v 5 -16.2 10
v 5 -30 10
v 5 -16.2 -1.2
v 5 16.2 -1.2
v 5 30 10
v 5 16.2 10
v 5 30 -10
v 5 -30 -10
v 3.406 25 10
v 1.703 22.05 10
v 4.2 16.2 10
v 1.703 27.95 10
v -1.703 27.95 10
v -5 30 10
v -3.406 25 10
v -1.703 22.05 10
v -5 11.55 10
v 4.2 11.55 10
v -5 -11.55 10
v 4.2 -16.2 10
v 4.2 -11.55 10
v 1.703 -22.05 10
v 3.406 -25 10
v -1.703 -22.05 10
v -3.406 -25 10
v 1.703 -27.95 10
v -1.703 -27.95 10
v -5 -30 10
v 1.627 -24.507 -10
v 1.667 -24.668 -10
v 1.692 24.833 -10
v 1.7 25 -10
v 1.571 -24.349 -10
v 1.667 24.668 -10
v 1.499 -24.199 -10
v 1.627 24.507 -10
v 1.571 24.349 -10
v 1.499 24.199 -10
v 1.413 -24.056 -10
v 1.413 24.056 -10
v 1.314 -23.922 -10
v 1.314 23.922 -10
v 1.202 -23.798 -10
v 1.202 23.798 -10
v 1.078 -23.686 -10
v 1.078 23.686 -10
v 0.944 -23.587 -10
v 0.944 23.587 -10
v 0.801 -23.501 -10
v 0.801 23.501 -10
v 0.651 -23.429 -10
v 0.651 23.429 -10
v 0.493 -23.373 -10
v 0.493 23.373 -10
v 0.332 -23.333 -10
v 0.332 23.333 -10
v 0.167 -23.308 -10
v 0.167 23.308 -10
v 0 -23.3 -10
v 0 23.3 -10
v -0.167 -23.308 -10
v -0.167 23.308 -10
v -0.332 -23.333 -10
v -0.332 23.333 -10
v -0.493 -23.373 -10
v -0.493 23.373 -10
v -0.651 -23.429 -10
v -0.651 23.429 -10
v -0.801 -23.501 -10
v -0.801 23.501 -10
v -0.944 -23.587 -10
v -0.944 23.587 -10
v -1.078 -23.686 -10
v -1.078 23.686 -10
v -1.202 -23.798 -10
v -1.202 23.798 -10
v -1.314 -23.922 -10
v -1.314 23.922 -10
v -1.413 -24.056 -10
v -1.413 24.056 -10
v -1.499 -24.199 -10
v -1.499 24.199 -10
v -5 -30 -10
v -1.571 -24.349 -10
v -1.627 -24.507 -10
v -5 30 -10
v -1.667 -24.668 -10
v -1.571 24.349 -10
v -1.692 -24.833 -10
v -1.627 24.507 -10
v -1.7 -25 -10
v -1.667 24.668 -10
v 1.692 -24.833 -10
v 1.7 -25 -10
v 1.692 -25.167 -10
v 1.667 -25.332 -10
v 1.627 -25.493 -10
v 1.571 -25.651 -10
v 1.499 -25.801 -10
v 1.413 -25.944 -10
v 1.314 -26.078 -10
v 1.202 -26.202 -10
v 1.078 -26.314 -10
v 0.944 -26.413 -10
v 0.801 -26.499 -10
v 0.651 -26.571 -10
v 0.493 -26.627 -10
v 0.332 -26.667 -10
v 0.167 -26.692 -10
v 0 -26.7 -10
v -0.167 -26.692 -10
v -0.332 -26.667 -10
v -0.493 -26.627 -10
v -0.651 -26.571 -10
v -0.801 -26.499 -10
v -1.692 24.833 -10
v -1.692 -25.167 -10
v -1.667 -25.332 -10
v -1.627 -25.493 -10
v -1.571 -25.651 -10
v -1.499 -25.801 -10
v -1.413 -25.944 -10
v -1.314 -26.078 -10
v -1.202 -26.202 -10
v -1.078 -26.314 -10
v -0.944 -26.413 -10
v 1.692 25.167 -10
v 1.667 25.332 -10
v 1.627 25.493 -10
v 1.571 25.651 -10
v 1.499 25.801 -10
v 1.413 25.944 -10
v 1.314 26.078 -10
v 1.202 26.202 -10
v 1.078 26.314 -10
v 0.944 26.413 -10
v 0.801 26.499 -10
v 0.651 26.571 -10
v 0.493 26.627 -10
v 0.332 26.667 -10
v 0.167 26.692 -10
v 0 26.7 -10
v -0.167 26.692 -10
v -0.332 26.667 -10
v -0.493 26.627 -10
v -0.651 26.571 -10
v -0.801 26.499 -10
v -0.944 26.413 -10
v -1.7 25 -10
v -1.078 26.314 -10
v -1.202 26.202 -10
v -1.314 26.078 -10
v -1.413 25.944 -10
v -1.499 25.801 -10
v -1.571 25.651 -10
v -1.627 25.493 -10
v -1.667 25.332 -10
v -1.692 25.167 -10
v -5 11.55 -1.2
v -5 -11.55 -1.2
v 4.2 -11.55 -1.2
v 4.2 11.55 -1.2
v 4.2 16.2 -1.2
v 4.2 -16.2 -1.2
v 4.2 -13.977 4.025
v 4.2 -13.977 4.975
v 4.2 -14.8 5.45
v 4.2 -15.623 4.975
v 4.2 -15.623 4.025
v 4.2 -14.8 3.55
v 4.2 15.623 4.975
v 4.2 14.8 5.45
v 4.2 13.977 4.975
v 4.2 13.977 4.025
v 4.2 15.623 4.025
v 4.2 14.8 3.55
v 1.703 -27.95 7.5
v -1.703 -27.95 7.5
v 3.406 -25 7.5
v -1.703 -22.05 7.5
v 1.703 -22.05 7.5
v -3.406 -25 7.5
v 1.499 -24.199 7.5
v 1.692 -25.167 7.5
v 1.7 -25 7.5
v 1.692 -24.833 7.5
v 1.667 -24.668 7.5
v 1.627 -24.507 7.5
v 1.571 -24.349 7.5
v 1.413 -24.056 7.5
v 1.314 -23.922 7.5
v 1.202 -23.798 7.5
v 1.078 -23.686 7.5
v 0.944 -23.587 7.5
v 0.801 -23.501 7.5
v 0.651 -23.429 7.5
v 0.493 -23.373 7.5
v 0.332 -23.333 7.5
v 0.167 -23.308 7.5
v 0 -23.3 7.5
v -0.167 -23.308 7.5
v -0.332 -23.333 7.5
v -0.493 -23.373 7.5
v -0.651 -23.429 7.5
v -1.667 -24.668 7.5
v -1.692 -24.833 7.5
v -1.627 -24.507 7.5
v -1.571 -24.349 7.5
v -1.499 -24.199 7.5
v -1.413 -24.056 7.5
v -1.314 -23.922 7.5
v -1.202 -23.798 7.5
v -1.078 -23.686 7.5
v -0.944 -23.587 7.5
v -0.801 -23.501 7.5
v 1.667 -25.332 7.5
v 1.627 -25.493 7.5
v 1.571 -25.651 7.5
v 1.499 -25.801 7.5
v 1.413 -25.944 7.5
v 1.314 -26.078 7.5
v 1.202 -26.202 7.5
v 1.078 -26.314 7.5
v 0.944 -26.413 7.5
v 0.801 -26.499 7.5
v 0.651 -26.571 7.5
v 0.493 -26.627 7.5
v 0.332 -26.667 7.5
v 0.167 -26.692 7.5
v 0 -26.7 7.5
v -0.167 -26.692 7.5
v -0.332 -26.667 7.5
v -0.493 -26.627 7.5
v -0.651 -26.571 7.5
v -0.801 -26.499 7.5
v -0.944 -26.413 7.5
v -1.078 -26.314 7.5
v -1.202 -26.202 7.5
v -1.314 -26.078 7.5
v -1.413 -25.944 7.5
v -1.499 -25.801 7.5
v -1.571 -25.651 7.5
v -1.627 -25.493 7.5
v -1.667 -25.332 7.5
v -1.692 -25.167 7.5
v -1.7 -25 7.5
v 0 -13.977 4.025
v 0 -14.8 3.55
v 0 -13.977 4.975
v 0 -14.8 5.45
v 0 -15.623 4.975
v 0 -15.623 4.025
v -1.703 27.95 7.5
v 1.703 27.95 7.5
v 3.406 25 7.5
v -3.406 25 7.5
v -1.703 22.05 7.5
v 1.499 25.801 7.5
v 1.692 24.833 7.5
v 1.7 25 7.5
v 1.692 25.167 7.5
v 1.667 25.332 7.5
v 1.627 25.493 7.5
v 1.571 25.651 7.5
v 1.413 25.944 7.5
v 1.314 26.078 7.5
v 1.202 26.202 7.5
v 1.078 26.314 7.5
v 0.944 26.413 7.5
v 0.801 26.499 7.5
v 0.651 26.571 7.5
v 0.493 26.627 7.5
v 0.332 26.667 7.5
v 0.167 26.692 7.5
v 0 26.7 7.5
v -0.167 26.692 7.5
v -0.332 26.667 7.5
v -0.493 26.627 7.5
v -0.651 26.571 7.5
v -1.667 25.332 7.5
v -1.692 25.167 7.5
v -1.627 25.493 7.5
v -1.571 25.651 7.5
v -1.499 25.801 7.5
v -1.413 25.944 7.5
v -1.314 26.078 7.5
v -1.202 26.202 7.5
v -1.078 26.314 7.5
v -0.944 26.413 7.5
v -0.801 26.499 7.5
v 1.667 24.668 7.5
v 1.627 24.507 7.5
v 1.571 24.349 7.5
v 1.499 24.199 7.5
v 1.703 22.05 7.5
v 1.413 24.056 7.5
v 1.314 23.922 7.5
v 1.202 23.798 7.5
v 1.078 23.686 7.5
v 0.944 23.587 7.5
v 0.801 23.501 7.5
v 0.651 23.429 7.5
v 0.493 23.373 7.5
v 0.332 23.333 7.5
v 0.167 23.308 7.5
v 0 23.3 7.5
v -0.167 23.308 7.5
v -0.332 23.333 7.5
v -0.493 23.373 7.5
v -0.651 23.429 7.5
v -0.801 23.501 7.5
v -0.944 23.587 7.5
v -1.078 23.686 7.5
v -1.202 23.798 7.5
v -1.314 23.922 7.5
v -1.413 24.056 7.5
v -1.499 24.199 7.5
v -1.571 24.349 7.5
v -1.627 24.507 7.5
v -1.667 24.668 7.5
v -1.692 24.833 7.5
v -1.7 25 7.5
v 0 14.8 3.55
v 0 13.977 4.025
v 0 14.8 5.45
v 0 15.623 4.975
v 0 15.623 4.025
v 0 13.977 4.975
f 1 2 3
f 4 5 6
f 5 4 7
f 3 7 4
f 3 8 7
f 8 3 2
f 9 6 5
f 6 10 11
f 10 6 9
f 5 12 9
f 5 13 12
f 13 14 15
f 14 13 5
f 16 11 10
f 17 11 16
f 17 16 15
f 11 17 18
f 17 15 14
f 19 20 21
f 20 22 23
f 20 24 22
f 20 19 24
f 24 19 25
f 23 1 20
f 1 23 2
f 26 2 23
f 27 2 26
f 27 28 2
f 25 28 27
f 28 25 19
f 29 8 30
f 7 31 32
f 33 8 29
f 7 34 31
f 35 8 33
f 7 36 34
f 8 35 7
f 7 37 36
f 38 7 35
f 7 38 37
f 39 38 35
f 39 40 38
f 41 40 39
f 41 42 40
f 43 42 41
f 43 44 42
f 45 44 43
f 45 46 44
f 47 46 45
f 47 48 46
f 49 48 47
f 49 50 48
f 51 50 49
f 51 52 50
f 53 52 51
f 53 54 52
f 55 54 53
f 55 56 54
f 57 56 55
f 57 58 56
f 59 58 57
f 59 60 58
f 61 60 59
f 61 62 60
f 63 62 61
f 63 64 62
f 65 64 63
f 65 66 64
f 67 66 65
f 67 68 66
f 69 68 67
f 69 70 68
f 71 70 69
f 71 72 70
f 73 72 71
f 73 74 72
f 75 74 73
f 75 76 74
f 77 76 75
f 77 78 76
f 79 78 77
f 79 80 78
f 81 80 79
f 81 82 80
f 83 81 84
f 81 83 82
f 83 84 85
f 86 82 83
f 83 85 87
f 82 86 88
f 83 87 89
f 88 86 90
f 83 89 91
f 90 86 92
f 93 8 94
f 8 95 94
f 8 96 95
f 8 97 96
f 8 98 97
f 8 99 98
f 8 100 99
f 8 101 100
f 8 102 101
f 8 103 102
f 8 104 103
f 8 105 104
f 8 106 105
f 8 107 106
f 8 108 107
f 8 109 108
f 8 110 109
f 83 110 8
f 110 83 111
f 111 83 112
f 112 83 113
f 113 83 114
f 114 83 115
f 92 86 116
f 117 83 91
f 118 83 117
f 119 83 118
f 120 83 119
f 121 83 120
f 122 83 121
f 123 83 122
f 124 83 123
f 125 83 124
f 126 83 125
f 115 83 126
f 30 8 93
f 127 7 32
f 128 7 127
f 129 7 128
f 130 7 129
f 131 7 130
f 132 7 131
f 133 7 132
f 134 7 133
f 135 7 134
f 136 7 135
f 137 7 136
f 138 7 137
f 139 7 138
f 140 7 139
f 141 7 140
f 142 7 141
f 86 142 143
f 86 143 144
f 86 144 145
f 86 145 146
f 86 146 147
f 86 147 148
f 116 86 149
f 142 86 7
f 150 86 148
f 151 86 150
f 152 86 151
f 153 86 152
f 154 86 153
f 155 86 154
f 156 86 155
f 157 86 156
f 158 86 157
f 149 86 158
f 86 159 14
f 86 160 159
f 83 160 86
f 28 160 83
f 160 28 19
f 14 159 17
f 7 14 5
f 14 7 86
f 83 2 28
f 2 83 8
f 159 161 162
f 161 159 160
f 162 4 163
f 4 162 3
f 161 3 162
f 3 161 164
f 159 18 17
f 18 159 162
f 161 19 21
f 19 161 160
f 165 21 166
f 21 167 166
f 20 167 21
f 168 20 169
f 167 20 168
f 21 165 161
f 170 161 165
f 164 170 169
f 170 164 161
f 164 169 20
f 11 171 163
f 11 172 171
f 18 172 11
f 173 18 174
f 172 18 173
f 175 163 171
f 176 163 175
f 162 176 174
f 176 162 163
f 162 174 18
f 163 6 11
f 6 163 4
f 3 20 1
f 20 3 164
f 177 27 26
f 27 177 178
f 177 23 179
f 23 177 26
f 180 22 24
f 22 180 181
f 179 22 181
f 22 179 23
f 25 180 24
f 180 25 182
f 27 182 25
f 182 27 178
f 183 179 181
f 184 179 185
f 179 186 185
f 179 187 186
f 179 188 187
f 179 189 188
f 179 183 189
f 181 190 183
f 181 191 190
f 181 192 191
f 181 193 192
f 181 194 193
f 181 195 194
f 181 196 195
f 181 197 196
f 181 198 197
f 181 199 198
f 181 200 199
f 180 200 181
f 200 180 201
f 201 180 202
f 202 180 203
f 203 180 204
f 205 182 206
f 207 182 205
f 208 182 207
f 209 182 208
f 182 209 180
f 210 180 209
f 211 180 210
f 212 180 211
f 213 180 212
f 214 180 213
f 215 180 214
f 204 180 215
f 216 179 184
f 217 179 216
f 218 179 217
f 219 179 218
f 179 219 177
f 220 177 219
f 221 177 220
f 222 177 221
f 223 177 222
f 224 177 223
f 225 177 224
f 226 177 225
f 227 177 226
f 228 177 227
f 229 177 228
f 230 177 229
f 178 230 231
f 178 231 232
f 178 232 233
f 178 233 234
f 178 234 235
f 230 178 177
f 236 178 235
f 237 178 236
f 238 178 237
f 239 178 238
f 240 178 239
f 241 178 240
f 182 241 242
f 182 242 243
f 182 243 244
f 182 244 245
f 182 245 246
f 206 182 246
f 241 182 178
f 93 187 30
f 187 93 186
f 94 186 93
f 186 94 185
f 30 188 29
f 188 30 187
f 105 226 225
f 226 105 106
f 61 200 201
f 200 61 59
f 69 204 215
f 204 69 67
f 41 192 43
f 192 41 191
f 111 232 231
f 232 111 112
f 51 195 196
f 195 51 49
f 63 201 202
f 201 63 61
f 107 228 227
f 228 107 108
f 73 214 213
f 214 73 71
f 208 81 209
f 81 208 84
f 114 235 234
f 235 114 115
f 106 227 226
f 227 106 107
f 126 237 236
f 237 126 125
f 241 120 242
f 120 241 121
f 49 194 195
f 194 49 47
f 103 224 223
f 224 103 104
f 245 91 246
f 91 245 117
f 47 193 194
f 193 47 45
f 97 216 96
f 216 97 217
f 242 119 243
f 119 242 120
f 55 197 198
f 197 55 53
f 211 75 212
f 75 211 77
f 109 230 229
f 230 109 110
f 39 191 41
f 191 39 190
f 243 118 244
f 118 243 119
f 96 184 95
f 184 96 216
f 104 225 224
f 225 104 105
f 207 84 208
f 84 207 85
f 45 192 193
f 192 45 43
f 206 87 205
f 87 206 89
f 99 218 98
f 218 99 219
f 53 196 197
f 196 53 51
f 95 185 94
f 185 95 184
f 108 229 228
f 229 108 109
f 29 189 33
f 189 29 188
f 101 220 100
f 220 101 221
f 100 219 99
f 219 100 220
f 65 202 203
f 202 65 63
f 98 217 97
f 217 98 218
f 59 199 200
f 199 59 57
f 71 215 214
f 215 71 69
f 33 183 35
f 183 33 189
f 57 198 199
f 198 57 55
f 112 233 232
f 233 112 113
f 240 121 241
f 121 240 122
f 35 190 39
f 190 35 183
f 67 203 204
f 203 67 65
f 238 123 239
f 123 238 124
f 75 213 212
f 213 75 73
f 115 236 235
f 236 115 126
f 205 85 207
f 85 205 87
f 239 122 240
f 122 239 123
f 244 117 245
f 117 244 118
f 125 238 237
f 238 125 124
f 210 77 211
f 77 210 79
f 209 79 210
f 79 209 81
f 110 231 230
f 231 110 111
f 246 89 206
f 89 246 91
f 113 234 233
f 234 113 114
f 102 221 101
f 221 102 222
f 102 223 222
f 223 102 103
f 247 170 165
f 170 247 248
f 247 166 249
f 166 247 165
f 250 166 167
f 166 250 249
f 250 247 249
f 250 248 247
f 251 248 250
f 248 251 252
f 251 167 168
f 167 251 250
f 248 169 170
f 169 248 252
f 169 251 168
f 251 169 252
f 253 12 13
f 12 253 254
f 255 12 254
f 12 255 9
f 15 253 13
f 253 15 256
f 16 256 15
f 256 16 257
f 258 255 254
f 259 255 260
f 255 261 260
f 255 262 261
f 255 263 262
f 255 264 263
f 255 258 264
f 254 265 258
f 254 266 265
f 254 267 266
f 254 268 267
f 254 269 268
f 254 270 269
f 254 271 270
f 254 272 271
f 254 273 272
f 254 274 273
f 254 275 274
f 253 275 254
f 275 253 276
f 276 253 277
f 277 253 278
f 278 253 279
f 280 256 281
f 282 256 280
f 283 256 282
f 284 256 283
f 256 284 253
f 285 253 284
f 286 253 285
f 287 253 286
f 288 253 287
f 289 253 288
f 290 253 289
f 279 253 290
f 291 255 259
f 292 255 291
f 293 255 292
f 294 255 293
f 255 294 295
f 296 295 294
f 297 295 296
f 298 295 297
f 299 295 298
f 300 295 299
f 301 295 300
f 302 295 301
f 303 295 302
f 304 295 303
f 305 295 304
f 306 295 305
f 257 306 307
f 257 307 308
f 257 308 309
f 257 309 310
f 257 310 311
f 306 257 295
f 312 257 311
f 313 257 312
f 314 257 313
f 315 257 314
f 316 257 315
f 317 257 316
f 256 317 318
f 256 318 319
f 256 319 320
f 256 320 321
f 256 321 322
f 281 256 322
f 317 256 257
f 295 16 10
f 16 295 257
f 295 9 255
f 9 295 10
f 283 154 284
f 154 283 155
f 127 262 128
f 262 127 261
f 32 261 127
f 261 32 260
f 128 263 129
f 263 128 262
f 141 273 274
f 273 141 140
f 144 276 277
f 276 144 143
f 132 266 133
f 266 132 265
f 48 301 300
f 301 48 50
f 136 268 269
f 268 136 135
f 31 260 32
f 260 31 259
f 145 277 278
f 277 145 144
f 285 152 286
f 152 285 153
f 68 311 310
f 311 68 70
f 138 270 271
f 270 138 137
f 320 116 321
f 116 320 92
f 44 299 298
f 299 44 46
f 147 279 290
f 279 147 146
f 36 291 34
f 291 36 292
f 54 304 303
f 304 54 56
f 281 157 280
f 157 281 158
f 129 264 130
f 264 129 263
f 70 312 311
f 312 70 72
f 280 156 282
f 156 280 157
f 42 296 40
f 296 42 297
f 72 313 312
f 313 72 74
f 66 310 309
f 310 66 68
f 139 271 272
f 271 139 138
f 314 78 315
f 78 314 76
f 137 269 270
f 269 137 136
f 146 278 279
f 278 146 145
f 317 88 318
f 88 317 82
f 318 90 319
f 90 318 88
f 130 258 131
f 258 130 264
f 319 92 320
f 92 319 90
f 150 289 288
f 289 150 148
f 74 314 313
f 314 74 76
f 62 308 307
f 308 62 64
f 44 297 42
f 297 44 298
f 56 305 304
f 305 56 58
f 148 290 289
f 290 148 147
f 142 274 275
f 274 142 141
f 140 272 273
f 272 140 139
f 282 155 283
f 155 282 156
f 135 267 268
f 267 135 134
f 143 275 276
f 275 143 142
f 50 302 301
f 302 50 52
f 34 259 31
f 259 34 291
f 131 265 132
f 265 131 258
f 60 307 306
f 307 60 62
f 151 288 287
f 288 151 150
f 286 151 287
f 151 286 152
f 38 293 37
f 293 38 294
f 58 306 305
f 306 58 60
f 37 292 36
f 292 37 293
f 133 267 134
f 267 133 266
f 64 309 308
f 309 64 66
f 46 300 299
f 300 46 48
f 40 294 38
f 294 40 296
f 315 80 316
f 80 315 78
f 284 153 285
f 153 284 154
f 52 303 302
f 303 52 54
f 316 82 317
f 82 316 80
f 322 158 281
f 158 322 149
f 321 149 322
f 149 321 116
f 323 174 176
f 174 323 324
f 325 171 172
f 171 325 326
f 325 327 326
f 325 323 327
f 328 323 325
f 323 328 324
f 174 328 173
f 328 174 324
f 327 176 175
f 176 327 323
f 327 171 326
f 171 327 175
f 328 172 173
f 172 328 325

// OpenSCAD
difference()
{
    translate([-5.0000, -30.0000, -10.0000])
    {
        cube([10.0000, 60.0000, 20.0000]);
    }
    translate([-5.5000, -11.5500, -1.2000])
    {
        cube([11.0000, 23.1000, 12.2000]);
    }
    translate([4.2000, -16.2000, -1.2000])
    {
        cube([1.9000, 32.4000, 12.2000]);
    }
    translate([0.0000, -25.0000, 7.5000])
    {
        cylinder(d = 6.8127, h = 5.0000, $fn = 6);
    }
    translate([0.0000, -25.0000, -11.0000])
    {
        cylinder(d = 3.4000, h = 70.0000, $fn = 64);
    }
    rotate([0.0000, 90.0000, 0.0000])
    {
        translate([-4.5000, -14.8000, 0.0000])
        {
            cylinder(d = 1.9000, h = 7.0000, $fn = 6);
        }
    }
    translate([0.0000, 25.0000, 7.5000])
    {
        cylinder(d = 6.8127, h = 5.0000, $fn = 6);
    }
    translate([0.0000, 25.0000, -11.0000])
    {
        cylinder(d = 3.4000, h = 70.0000, $fn = 64);
    }
    rotate([0.0000, 90.0000, 0.0000])
    {
        translate([-4.5000, 14.8000, 0.0000])
        {
            cylinder(d = 1.9000, h = 7.0000, $fn = 6);
        }
    }
}
